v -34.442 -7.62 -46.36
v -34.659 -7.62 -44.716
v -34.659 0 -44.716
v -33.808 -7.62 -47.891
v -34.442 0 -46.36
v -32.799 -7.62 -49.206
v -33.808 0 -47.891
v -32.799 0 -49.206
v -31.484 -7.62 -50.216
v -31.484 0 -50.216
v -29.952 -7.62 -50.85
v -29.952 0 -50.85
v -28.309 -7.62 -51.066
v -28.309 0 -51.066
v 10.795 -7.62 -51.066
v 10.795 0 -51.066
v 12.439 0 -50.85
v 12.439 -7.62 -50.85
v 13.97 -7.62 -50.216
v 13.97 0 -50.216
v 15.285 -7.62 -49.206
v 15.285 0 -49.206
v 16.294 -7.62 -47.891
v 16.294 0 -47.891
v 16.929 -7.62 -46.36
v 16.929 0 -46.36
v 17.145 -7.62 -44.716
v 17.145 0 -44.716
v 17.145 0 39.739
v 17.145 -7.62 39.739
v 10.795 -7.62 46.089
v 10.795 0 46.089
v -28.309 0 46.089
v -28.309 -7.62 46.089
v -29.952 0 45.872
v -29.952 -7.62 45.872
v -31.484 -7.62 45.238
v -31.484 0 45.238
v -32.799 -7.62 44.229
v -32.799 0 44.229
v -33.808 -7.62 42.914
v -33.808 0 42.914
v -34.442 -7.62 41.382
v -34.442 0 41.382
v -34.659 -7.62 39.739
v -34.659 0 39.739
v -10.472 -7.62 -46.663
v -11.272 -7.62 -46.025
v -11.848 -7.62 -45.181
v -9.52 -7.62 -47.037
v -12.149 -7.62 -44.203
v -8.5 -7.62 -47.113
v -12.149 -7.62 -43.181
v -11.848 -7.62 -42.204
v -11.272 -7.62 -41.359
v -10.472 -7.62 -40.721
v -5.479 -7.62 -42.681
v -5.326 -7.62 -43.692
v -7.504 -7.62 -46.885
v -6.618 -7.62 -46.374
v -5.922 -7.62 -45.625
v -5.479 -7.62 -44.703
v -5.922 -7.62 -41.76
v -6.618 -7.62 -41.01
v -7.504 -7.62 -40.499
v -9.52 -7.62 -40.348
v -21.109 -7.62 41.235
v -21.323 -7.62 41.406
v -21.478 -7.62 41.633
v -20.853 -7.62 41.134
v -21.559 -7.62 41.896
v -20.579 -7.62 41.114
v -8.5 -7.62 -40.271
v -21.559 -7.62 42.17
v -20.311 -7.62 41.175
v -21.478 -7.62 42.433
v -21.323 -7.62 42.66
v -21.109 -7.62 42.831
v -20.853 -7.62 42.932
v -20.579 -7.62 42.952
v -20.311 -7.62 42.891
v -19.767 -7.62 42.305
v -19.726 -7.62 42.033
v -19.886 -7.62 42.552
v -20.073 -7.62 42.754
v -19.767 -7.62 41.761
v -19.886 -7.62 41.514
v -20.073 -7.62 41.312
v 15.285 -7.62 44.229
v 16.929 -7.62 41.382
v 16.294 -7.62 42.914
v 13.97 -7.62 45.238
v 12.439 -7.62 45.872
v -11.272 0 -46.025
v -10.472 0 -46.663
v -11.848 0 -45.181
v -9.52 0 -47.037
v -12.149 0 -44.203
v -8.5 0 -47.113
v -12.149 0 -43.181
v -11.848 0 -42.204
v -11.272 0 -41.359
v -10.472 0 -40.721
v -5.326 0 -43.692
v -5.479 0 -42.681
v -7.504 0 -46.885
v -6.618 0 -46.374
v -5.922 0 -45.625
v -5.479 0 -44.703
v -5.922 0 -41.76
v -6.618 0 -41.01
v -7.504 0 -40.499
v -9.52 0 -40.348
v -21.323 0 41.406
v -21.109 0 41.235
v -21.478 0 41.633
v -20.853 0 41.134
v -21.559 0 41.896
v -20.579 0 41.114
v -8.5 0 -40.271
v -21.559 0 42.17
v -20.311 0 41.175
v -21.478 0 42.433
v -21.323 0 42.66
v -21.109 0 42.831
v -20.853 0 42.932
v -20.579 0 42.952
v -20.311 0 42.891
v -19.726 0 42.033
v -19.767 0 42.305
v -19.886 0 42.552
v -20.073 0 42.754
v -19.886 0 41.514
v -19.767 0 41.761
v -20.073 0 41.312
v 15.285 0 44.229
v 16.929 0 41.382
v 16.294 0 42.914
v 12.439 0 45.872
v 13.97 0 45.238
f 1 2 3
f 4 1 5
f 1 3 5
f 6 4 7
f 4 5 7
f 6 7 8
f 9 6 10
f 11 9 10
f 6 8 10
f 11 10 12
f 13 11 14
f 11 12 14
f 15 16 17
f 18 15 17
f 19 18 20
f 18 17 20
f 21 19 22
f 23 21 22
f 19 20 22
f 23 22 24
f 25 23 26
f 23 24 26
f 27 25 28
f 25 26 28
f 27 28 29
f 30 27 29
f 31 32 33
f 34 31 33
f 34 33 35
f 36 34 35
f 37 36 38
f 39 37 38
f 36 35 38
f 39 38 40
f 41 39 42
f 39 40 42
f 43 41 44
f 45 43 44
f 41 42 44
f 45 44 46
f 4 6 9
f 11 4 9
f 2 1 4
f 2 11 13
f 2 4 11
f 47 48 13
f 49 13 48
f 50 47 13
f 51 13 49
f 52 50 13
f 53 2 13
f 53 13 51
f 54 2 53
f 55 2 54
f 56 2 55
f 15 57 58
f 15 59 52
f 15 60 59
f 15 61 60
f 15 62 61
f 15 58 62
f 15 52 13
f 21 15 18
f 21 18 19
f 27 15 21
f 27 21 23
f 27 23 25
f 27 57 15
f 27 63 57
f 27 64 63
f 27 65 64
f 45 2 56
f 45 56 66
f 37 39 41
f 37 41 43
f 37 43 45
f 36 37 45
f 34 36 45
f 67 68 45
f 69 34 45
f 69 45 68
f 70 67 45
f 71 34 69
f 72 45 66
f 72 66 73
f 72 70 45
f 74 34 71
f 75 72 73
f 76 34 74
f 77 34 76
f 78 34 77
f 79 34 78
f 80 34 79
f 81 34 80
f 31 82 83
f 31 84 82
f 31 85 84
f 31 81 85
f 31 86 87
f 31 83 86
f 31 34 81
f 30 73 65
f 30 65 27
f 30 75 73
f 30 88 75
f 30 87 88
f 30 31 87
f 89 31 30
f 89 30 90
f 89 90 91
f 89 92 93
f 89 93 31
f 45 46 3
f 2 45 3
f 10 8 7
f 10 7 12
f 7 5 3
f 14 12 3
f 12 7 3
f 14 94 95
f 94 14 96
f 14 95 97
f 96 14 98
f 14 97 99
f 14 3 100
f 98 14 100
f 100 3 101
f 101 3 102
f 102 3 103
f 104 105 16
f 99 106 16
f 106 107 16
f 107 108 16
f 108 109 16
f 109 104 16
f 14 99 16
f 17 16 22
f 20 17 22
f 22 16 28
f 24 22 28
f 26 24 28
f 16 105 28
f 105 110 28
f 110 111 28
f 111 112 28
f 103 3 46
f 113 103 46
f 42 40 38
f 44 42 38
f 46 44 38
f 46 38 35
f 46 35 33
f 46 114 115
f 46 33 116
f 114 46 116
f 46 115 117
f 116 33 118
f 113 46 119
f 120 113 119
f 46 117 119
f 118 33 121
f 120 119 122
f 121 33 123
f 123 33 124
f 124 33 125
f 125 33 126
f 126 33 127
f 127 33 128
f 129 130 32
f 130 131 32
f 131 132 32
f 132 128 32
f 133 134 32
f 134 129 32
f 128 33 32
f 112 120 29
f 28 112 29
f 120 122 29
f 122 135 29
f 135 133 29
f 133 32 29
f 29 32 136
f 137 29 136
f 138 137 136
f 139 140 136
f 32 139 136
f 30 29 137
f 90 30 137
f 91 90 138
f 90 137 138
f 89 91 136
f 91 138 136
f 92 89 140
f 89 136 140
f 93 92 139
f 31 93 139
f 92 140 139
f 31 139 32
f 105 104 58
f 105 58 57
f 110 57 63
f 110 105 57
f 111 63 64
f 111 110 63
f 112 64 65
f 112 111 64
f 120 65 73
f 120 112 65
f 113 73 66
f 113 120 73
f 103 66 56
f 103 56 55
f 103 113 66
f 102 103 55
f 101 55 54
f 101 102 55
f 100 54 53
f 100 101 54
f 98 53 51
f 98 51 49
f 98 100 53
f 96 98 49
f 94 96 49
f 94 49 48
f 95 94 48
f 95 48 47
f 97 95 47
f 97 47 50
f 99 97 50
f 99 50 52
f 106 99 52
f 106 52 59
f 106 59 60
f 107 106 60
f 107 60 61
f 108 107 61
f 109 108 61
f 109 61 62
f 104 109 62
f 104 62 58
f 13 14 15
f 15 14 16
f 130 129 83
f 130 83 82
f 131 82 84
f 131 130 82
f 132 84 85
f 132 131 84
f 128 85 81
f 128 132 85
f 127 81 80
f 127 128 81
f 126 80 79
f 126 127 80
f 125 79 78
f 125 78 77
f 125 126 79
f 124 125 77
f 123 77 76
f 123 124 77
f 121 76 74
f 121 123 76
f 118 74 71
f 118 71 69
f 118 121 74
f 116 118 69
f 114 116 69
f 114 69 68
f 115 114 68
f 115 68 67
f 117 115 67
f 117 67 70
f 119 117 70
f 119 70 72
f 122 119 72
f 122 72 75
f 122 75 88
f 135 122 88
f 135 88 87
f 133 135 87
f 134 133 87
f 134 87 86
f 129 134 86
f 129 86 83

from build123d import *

# Parameters (mm, degrees)
F0_R     = 0.9217746556
F0_W     = 51.8037118018
F0_H     = 75.0324204564
F0_R_2   = 3.4304363285
F1_DEPTH = 1.27
F2_DEPTH = 7.62


with BuildPart() as f1:
    # F0 (on Front) → F1 (new body)
    with BuildSketch(Plane.XZ):
        with BuildLine():
            ThreePointArc((-28.3087114036, 46.0887122899), (-32.7988394641, 44.2288403505), (-34.6587114036, 39.7387122899))
            Line((-34.6587114036, 39.7387122899), (-34.6587114036, 36.3179035485))
            Line((-34.6587114036, 36.3179035485), (17.1450003982, 36.3179035485))
            Line((17.1450003982, 36.3179035485), (17.1450003982, 39.7387122899))
            ThreePointArc((17.1450003982, 39.7387122899), (15.2851284587, 44.2288403505), (10.7950003982, 46.0887122899))
            Line((10.7950003982, 46.0887122899), (-28.3087114036, 46.0887122899))
        make_face()
        with Locations((-20.6477418542, 42.032904923)):
            Circle(F0_R, mode=Mode.SUBTRACT)
        with Locations((-8.7568555027, -1.1983066797)):
            Rectangle(F0_W, F0_H)
        with BuildLine():
            Line((17.1450003982, -38.7145169079), (-34.6587114036, -38.7145169079))
            Line((-34.6587114036, -38.7145169079), (-34.6587114036, -44.7162905872))
            ThreePointArc((-34.6587114036, -44.7162905872), (-32.7988394641, -49.2064186477), (-28.3087114036, -51.0662905872))
            Line((-28.3087114036, -51.0662905872), (10.7950003982, -51.0662905872))
            ThreePointArc((10.7950003982, -51.0662905872), (15.2851284587, -49.2064186477), (17.1450003982, -44.7162905872))
            Line((17.1450003982, -44.7162905872), (17.1450003982, -38.7145169079))
        make_face()
        with Locations((-8.7568555027, -43.6921007931)):
            Circle(F0_R_2, mode=Mode.SUBTRACT)
    extrude(amount=F1_DEPTH)

    # F0 (on Front) → F2 (join)
    with BuildSketch(Plane.XZ):
        with BuildLine():
            ThreePointArc((-28.3087114036, 46.0887122899), (-32.7988394641, 44.2288403505), (-34.6587114036, 39.7387122899))
            Line((-34.6587114036, 39.7387122899), (-34.6587114036, 36.3179035485))
            Line((-34.6587114036, 36.3179035485), (17.1450003982, 36.3179035485))
            Line((17.1450003982, 36.3179035485), (17.1450003982, 39.7387122899))
            ThreePointArc((17.1450003982, 39.7387122899), (15.2851284587, 44.2288403505), (10.7950003982, 46.0887122899))
            Line((10.7950003982, 46.0887122899), (-28.3087114036, 46.0887122899))
        make_face()
        with Locations((-20.6477418542, 42.032904923)):
            Circle(F0_R, mode=Mode.SUBTRACT)
        with Locations((-8.7568555027, -1.1983066797)):
            Rectangle(F0_W, F0_H)
        with BuildLine():
            Line((17.1450003982, -38.7145169079), (-34.6587114036, -38.7145169079))
            Line((-34.6587114036, -38.7145169079), (-34.6587114036, -44.7162905872))
            ThreePointArc((-34.6587114036, -44.7162905872), (-32.7988394641, -49.2064186477), (-28.3087114036, -51.0662905872))
            Line((-28.3087114036, -51.0662905872), (10.7950003982, -51.0662905872))
            ThreePointArc((10.7950003982, -51.0662905872), (15.2851284587, -49.2064186477), (17.1450003982, -44.7162905872))
            Line((17.1450003982, -44.7162905872), (17.1450003982, -38.7145169079))
        make_face()
        with Locations((-8.7568555027, -43.6921007931)):
            Circle(F0_R_2, mode=Mode.SUBTRACT)
    extrude(amount=F2_DEPTH)


solid = f1.part
